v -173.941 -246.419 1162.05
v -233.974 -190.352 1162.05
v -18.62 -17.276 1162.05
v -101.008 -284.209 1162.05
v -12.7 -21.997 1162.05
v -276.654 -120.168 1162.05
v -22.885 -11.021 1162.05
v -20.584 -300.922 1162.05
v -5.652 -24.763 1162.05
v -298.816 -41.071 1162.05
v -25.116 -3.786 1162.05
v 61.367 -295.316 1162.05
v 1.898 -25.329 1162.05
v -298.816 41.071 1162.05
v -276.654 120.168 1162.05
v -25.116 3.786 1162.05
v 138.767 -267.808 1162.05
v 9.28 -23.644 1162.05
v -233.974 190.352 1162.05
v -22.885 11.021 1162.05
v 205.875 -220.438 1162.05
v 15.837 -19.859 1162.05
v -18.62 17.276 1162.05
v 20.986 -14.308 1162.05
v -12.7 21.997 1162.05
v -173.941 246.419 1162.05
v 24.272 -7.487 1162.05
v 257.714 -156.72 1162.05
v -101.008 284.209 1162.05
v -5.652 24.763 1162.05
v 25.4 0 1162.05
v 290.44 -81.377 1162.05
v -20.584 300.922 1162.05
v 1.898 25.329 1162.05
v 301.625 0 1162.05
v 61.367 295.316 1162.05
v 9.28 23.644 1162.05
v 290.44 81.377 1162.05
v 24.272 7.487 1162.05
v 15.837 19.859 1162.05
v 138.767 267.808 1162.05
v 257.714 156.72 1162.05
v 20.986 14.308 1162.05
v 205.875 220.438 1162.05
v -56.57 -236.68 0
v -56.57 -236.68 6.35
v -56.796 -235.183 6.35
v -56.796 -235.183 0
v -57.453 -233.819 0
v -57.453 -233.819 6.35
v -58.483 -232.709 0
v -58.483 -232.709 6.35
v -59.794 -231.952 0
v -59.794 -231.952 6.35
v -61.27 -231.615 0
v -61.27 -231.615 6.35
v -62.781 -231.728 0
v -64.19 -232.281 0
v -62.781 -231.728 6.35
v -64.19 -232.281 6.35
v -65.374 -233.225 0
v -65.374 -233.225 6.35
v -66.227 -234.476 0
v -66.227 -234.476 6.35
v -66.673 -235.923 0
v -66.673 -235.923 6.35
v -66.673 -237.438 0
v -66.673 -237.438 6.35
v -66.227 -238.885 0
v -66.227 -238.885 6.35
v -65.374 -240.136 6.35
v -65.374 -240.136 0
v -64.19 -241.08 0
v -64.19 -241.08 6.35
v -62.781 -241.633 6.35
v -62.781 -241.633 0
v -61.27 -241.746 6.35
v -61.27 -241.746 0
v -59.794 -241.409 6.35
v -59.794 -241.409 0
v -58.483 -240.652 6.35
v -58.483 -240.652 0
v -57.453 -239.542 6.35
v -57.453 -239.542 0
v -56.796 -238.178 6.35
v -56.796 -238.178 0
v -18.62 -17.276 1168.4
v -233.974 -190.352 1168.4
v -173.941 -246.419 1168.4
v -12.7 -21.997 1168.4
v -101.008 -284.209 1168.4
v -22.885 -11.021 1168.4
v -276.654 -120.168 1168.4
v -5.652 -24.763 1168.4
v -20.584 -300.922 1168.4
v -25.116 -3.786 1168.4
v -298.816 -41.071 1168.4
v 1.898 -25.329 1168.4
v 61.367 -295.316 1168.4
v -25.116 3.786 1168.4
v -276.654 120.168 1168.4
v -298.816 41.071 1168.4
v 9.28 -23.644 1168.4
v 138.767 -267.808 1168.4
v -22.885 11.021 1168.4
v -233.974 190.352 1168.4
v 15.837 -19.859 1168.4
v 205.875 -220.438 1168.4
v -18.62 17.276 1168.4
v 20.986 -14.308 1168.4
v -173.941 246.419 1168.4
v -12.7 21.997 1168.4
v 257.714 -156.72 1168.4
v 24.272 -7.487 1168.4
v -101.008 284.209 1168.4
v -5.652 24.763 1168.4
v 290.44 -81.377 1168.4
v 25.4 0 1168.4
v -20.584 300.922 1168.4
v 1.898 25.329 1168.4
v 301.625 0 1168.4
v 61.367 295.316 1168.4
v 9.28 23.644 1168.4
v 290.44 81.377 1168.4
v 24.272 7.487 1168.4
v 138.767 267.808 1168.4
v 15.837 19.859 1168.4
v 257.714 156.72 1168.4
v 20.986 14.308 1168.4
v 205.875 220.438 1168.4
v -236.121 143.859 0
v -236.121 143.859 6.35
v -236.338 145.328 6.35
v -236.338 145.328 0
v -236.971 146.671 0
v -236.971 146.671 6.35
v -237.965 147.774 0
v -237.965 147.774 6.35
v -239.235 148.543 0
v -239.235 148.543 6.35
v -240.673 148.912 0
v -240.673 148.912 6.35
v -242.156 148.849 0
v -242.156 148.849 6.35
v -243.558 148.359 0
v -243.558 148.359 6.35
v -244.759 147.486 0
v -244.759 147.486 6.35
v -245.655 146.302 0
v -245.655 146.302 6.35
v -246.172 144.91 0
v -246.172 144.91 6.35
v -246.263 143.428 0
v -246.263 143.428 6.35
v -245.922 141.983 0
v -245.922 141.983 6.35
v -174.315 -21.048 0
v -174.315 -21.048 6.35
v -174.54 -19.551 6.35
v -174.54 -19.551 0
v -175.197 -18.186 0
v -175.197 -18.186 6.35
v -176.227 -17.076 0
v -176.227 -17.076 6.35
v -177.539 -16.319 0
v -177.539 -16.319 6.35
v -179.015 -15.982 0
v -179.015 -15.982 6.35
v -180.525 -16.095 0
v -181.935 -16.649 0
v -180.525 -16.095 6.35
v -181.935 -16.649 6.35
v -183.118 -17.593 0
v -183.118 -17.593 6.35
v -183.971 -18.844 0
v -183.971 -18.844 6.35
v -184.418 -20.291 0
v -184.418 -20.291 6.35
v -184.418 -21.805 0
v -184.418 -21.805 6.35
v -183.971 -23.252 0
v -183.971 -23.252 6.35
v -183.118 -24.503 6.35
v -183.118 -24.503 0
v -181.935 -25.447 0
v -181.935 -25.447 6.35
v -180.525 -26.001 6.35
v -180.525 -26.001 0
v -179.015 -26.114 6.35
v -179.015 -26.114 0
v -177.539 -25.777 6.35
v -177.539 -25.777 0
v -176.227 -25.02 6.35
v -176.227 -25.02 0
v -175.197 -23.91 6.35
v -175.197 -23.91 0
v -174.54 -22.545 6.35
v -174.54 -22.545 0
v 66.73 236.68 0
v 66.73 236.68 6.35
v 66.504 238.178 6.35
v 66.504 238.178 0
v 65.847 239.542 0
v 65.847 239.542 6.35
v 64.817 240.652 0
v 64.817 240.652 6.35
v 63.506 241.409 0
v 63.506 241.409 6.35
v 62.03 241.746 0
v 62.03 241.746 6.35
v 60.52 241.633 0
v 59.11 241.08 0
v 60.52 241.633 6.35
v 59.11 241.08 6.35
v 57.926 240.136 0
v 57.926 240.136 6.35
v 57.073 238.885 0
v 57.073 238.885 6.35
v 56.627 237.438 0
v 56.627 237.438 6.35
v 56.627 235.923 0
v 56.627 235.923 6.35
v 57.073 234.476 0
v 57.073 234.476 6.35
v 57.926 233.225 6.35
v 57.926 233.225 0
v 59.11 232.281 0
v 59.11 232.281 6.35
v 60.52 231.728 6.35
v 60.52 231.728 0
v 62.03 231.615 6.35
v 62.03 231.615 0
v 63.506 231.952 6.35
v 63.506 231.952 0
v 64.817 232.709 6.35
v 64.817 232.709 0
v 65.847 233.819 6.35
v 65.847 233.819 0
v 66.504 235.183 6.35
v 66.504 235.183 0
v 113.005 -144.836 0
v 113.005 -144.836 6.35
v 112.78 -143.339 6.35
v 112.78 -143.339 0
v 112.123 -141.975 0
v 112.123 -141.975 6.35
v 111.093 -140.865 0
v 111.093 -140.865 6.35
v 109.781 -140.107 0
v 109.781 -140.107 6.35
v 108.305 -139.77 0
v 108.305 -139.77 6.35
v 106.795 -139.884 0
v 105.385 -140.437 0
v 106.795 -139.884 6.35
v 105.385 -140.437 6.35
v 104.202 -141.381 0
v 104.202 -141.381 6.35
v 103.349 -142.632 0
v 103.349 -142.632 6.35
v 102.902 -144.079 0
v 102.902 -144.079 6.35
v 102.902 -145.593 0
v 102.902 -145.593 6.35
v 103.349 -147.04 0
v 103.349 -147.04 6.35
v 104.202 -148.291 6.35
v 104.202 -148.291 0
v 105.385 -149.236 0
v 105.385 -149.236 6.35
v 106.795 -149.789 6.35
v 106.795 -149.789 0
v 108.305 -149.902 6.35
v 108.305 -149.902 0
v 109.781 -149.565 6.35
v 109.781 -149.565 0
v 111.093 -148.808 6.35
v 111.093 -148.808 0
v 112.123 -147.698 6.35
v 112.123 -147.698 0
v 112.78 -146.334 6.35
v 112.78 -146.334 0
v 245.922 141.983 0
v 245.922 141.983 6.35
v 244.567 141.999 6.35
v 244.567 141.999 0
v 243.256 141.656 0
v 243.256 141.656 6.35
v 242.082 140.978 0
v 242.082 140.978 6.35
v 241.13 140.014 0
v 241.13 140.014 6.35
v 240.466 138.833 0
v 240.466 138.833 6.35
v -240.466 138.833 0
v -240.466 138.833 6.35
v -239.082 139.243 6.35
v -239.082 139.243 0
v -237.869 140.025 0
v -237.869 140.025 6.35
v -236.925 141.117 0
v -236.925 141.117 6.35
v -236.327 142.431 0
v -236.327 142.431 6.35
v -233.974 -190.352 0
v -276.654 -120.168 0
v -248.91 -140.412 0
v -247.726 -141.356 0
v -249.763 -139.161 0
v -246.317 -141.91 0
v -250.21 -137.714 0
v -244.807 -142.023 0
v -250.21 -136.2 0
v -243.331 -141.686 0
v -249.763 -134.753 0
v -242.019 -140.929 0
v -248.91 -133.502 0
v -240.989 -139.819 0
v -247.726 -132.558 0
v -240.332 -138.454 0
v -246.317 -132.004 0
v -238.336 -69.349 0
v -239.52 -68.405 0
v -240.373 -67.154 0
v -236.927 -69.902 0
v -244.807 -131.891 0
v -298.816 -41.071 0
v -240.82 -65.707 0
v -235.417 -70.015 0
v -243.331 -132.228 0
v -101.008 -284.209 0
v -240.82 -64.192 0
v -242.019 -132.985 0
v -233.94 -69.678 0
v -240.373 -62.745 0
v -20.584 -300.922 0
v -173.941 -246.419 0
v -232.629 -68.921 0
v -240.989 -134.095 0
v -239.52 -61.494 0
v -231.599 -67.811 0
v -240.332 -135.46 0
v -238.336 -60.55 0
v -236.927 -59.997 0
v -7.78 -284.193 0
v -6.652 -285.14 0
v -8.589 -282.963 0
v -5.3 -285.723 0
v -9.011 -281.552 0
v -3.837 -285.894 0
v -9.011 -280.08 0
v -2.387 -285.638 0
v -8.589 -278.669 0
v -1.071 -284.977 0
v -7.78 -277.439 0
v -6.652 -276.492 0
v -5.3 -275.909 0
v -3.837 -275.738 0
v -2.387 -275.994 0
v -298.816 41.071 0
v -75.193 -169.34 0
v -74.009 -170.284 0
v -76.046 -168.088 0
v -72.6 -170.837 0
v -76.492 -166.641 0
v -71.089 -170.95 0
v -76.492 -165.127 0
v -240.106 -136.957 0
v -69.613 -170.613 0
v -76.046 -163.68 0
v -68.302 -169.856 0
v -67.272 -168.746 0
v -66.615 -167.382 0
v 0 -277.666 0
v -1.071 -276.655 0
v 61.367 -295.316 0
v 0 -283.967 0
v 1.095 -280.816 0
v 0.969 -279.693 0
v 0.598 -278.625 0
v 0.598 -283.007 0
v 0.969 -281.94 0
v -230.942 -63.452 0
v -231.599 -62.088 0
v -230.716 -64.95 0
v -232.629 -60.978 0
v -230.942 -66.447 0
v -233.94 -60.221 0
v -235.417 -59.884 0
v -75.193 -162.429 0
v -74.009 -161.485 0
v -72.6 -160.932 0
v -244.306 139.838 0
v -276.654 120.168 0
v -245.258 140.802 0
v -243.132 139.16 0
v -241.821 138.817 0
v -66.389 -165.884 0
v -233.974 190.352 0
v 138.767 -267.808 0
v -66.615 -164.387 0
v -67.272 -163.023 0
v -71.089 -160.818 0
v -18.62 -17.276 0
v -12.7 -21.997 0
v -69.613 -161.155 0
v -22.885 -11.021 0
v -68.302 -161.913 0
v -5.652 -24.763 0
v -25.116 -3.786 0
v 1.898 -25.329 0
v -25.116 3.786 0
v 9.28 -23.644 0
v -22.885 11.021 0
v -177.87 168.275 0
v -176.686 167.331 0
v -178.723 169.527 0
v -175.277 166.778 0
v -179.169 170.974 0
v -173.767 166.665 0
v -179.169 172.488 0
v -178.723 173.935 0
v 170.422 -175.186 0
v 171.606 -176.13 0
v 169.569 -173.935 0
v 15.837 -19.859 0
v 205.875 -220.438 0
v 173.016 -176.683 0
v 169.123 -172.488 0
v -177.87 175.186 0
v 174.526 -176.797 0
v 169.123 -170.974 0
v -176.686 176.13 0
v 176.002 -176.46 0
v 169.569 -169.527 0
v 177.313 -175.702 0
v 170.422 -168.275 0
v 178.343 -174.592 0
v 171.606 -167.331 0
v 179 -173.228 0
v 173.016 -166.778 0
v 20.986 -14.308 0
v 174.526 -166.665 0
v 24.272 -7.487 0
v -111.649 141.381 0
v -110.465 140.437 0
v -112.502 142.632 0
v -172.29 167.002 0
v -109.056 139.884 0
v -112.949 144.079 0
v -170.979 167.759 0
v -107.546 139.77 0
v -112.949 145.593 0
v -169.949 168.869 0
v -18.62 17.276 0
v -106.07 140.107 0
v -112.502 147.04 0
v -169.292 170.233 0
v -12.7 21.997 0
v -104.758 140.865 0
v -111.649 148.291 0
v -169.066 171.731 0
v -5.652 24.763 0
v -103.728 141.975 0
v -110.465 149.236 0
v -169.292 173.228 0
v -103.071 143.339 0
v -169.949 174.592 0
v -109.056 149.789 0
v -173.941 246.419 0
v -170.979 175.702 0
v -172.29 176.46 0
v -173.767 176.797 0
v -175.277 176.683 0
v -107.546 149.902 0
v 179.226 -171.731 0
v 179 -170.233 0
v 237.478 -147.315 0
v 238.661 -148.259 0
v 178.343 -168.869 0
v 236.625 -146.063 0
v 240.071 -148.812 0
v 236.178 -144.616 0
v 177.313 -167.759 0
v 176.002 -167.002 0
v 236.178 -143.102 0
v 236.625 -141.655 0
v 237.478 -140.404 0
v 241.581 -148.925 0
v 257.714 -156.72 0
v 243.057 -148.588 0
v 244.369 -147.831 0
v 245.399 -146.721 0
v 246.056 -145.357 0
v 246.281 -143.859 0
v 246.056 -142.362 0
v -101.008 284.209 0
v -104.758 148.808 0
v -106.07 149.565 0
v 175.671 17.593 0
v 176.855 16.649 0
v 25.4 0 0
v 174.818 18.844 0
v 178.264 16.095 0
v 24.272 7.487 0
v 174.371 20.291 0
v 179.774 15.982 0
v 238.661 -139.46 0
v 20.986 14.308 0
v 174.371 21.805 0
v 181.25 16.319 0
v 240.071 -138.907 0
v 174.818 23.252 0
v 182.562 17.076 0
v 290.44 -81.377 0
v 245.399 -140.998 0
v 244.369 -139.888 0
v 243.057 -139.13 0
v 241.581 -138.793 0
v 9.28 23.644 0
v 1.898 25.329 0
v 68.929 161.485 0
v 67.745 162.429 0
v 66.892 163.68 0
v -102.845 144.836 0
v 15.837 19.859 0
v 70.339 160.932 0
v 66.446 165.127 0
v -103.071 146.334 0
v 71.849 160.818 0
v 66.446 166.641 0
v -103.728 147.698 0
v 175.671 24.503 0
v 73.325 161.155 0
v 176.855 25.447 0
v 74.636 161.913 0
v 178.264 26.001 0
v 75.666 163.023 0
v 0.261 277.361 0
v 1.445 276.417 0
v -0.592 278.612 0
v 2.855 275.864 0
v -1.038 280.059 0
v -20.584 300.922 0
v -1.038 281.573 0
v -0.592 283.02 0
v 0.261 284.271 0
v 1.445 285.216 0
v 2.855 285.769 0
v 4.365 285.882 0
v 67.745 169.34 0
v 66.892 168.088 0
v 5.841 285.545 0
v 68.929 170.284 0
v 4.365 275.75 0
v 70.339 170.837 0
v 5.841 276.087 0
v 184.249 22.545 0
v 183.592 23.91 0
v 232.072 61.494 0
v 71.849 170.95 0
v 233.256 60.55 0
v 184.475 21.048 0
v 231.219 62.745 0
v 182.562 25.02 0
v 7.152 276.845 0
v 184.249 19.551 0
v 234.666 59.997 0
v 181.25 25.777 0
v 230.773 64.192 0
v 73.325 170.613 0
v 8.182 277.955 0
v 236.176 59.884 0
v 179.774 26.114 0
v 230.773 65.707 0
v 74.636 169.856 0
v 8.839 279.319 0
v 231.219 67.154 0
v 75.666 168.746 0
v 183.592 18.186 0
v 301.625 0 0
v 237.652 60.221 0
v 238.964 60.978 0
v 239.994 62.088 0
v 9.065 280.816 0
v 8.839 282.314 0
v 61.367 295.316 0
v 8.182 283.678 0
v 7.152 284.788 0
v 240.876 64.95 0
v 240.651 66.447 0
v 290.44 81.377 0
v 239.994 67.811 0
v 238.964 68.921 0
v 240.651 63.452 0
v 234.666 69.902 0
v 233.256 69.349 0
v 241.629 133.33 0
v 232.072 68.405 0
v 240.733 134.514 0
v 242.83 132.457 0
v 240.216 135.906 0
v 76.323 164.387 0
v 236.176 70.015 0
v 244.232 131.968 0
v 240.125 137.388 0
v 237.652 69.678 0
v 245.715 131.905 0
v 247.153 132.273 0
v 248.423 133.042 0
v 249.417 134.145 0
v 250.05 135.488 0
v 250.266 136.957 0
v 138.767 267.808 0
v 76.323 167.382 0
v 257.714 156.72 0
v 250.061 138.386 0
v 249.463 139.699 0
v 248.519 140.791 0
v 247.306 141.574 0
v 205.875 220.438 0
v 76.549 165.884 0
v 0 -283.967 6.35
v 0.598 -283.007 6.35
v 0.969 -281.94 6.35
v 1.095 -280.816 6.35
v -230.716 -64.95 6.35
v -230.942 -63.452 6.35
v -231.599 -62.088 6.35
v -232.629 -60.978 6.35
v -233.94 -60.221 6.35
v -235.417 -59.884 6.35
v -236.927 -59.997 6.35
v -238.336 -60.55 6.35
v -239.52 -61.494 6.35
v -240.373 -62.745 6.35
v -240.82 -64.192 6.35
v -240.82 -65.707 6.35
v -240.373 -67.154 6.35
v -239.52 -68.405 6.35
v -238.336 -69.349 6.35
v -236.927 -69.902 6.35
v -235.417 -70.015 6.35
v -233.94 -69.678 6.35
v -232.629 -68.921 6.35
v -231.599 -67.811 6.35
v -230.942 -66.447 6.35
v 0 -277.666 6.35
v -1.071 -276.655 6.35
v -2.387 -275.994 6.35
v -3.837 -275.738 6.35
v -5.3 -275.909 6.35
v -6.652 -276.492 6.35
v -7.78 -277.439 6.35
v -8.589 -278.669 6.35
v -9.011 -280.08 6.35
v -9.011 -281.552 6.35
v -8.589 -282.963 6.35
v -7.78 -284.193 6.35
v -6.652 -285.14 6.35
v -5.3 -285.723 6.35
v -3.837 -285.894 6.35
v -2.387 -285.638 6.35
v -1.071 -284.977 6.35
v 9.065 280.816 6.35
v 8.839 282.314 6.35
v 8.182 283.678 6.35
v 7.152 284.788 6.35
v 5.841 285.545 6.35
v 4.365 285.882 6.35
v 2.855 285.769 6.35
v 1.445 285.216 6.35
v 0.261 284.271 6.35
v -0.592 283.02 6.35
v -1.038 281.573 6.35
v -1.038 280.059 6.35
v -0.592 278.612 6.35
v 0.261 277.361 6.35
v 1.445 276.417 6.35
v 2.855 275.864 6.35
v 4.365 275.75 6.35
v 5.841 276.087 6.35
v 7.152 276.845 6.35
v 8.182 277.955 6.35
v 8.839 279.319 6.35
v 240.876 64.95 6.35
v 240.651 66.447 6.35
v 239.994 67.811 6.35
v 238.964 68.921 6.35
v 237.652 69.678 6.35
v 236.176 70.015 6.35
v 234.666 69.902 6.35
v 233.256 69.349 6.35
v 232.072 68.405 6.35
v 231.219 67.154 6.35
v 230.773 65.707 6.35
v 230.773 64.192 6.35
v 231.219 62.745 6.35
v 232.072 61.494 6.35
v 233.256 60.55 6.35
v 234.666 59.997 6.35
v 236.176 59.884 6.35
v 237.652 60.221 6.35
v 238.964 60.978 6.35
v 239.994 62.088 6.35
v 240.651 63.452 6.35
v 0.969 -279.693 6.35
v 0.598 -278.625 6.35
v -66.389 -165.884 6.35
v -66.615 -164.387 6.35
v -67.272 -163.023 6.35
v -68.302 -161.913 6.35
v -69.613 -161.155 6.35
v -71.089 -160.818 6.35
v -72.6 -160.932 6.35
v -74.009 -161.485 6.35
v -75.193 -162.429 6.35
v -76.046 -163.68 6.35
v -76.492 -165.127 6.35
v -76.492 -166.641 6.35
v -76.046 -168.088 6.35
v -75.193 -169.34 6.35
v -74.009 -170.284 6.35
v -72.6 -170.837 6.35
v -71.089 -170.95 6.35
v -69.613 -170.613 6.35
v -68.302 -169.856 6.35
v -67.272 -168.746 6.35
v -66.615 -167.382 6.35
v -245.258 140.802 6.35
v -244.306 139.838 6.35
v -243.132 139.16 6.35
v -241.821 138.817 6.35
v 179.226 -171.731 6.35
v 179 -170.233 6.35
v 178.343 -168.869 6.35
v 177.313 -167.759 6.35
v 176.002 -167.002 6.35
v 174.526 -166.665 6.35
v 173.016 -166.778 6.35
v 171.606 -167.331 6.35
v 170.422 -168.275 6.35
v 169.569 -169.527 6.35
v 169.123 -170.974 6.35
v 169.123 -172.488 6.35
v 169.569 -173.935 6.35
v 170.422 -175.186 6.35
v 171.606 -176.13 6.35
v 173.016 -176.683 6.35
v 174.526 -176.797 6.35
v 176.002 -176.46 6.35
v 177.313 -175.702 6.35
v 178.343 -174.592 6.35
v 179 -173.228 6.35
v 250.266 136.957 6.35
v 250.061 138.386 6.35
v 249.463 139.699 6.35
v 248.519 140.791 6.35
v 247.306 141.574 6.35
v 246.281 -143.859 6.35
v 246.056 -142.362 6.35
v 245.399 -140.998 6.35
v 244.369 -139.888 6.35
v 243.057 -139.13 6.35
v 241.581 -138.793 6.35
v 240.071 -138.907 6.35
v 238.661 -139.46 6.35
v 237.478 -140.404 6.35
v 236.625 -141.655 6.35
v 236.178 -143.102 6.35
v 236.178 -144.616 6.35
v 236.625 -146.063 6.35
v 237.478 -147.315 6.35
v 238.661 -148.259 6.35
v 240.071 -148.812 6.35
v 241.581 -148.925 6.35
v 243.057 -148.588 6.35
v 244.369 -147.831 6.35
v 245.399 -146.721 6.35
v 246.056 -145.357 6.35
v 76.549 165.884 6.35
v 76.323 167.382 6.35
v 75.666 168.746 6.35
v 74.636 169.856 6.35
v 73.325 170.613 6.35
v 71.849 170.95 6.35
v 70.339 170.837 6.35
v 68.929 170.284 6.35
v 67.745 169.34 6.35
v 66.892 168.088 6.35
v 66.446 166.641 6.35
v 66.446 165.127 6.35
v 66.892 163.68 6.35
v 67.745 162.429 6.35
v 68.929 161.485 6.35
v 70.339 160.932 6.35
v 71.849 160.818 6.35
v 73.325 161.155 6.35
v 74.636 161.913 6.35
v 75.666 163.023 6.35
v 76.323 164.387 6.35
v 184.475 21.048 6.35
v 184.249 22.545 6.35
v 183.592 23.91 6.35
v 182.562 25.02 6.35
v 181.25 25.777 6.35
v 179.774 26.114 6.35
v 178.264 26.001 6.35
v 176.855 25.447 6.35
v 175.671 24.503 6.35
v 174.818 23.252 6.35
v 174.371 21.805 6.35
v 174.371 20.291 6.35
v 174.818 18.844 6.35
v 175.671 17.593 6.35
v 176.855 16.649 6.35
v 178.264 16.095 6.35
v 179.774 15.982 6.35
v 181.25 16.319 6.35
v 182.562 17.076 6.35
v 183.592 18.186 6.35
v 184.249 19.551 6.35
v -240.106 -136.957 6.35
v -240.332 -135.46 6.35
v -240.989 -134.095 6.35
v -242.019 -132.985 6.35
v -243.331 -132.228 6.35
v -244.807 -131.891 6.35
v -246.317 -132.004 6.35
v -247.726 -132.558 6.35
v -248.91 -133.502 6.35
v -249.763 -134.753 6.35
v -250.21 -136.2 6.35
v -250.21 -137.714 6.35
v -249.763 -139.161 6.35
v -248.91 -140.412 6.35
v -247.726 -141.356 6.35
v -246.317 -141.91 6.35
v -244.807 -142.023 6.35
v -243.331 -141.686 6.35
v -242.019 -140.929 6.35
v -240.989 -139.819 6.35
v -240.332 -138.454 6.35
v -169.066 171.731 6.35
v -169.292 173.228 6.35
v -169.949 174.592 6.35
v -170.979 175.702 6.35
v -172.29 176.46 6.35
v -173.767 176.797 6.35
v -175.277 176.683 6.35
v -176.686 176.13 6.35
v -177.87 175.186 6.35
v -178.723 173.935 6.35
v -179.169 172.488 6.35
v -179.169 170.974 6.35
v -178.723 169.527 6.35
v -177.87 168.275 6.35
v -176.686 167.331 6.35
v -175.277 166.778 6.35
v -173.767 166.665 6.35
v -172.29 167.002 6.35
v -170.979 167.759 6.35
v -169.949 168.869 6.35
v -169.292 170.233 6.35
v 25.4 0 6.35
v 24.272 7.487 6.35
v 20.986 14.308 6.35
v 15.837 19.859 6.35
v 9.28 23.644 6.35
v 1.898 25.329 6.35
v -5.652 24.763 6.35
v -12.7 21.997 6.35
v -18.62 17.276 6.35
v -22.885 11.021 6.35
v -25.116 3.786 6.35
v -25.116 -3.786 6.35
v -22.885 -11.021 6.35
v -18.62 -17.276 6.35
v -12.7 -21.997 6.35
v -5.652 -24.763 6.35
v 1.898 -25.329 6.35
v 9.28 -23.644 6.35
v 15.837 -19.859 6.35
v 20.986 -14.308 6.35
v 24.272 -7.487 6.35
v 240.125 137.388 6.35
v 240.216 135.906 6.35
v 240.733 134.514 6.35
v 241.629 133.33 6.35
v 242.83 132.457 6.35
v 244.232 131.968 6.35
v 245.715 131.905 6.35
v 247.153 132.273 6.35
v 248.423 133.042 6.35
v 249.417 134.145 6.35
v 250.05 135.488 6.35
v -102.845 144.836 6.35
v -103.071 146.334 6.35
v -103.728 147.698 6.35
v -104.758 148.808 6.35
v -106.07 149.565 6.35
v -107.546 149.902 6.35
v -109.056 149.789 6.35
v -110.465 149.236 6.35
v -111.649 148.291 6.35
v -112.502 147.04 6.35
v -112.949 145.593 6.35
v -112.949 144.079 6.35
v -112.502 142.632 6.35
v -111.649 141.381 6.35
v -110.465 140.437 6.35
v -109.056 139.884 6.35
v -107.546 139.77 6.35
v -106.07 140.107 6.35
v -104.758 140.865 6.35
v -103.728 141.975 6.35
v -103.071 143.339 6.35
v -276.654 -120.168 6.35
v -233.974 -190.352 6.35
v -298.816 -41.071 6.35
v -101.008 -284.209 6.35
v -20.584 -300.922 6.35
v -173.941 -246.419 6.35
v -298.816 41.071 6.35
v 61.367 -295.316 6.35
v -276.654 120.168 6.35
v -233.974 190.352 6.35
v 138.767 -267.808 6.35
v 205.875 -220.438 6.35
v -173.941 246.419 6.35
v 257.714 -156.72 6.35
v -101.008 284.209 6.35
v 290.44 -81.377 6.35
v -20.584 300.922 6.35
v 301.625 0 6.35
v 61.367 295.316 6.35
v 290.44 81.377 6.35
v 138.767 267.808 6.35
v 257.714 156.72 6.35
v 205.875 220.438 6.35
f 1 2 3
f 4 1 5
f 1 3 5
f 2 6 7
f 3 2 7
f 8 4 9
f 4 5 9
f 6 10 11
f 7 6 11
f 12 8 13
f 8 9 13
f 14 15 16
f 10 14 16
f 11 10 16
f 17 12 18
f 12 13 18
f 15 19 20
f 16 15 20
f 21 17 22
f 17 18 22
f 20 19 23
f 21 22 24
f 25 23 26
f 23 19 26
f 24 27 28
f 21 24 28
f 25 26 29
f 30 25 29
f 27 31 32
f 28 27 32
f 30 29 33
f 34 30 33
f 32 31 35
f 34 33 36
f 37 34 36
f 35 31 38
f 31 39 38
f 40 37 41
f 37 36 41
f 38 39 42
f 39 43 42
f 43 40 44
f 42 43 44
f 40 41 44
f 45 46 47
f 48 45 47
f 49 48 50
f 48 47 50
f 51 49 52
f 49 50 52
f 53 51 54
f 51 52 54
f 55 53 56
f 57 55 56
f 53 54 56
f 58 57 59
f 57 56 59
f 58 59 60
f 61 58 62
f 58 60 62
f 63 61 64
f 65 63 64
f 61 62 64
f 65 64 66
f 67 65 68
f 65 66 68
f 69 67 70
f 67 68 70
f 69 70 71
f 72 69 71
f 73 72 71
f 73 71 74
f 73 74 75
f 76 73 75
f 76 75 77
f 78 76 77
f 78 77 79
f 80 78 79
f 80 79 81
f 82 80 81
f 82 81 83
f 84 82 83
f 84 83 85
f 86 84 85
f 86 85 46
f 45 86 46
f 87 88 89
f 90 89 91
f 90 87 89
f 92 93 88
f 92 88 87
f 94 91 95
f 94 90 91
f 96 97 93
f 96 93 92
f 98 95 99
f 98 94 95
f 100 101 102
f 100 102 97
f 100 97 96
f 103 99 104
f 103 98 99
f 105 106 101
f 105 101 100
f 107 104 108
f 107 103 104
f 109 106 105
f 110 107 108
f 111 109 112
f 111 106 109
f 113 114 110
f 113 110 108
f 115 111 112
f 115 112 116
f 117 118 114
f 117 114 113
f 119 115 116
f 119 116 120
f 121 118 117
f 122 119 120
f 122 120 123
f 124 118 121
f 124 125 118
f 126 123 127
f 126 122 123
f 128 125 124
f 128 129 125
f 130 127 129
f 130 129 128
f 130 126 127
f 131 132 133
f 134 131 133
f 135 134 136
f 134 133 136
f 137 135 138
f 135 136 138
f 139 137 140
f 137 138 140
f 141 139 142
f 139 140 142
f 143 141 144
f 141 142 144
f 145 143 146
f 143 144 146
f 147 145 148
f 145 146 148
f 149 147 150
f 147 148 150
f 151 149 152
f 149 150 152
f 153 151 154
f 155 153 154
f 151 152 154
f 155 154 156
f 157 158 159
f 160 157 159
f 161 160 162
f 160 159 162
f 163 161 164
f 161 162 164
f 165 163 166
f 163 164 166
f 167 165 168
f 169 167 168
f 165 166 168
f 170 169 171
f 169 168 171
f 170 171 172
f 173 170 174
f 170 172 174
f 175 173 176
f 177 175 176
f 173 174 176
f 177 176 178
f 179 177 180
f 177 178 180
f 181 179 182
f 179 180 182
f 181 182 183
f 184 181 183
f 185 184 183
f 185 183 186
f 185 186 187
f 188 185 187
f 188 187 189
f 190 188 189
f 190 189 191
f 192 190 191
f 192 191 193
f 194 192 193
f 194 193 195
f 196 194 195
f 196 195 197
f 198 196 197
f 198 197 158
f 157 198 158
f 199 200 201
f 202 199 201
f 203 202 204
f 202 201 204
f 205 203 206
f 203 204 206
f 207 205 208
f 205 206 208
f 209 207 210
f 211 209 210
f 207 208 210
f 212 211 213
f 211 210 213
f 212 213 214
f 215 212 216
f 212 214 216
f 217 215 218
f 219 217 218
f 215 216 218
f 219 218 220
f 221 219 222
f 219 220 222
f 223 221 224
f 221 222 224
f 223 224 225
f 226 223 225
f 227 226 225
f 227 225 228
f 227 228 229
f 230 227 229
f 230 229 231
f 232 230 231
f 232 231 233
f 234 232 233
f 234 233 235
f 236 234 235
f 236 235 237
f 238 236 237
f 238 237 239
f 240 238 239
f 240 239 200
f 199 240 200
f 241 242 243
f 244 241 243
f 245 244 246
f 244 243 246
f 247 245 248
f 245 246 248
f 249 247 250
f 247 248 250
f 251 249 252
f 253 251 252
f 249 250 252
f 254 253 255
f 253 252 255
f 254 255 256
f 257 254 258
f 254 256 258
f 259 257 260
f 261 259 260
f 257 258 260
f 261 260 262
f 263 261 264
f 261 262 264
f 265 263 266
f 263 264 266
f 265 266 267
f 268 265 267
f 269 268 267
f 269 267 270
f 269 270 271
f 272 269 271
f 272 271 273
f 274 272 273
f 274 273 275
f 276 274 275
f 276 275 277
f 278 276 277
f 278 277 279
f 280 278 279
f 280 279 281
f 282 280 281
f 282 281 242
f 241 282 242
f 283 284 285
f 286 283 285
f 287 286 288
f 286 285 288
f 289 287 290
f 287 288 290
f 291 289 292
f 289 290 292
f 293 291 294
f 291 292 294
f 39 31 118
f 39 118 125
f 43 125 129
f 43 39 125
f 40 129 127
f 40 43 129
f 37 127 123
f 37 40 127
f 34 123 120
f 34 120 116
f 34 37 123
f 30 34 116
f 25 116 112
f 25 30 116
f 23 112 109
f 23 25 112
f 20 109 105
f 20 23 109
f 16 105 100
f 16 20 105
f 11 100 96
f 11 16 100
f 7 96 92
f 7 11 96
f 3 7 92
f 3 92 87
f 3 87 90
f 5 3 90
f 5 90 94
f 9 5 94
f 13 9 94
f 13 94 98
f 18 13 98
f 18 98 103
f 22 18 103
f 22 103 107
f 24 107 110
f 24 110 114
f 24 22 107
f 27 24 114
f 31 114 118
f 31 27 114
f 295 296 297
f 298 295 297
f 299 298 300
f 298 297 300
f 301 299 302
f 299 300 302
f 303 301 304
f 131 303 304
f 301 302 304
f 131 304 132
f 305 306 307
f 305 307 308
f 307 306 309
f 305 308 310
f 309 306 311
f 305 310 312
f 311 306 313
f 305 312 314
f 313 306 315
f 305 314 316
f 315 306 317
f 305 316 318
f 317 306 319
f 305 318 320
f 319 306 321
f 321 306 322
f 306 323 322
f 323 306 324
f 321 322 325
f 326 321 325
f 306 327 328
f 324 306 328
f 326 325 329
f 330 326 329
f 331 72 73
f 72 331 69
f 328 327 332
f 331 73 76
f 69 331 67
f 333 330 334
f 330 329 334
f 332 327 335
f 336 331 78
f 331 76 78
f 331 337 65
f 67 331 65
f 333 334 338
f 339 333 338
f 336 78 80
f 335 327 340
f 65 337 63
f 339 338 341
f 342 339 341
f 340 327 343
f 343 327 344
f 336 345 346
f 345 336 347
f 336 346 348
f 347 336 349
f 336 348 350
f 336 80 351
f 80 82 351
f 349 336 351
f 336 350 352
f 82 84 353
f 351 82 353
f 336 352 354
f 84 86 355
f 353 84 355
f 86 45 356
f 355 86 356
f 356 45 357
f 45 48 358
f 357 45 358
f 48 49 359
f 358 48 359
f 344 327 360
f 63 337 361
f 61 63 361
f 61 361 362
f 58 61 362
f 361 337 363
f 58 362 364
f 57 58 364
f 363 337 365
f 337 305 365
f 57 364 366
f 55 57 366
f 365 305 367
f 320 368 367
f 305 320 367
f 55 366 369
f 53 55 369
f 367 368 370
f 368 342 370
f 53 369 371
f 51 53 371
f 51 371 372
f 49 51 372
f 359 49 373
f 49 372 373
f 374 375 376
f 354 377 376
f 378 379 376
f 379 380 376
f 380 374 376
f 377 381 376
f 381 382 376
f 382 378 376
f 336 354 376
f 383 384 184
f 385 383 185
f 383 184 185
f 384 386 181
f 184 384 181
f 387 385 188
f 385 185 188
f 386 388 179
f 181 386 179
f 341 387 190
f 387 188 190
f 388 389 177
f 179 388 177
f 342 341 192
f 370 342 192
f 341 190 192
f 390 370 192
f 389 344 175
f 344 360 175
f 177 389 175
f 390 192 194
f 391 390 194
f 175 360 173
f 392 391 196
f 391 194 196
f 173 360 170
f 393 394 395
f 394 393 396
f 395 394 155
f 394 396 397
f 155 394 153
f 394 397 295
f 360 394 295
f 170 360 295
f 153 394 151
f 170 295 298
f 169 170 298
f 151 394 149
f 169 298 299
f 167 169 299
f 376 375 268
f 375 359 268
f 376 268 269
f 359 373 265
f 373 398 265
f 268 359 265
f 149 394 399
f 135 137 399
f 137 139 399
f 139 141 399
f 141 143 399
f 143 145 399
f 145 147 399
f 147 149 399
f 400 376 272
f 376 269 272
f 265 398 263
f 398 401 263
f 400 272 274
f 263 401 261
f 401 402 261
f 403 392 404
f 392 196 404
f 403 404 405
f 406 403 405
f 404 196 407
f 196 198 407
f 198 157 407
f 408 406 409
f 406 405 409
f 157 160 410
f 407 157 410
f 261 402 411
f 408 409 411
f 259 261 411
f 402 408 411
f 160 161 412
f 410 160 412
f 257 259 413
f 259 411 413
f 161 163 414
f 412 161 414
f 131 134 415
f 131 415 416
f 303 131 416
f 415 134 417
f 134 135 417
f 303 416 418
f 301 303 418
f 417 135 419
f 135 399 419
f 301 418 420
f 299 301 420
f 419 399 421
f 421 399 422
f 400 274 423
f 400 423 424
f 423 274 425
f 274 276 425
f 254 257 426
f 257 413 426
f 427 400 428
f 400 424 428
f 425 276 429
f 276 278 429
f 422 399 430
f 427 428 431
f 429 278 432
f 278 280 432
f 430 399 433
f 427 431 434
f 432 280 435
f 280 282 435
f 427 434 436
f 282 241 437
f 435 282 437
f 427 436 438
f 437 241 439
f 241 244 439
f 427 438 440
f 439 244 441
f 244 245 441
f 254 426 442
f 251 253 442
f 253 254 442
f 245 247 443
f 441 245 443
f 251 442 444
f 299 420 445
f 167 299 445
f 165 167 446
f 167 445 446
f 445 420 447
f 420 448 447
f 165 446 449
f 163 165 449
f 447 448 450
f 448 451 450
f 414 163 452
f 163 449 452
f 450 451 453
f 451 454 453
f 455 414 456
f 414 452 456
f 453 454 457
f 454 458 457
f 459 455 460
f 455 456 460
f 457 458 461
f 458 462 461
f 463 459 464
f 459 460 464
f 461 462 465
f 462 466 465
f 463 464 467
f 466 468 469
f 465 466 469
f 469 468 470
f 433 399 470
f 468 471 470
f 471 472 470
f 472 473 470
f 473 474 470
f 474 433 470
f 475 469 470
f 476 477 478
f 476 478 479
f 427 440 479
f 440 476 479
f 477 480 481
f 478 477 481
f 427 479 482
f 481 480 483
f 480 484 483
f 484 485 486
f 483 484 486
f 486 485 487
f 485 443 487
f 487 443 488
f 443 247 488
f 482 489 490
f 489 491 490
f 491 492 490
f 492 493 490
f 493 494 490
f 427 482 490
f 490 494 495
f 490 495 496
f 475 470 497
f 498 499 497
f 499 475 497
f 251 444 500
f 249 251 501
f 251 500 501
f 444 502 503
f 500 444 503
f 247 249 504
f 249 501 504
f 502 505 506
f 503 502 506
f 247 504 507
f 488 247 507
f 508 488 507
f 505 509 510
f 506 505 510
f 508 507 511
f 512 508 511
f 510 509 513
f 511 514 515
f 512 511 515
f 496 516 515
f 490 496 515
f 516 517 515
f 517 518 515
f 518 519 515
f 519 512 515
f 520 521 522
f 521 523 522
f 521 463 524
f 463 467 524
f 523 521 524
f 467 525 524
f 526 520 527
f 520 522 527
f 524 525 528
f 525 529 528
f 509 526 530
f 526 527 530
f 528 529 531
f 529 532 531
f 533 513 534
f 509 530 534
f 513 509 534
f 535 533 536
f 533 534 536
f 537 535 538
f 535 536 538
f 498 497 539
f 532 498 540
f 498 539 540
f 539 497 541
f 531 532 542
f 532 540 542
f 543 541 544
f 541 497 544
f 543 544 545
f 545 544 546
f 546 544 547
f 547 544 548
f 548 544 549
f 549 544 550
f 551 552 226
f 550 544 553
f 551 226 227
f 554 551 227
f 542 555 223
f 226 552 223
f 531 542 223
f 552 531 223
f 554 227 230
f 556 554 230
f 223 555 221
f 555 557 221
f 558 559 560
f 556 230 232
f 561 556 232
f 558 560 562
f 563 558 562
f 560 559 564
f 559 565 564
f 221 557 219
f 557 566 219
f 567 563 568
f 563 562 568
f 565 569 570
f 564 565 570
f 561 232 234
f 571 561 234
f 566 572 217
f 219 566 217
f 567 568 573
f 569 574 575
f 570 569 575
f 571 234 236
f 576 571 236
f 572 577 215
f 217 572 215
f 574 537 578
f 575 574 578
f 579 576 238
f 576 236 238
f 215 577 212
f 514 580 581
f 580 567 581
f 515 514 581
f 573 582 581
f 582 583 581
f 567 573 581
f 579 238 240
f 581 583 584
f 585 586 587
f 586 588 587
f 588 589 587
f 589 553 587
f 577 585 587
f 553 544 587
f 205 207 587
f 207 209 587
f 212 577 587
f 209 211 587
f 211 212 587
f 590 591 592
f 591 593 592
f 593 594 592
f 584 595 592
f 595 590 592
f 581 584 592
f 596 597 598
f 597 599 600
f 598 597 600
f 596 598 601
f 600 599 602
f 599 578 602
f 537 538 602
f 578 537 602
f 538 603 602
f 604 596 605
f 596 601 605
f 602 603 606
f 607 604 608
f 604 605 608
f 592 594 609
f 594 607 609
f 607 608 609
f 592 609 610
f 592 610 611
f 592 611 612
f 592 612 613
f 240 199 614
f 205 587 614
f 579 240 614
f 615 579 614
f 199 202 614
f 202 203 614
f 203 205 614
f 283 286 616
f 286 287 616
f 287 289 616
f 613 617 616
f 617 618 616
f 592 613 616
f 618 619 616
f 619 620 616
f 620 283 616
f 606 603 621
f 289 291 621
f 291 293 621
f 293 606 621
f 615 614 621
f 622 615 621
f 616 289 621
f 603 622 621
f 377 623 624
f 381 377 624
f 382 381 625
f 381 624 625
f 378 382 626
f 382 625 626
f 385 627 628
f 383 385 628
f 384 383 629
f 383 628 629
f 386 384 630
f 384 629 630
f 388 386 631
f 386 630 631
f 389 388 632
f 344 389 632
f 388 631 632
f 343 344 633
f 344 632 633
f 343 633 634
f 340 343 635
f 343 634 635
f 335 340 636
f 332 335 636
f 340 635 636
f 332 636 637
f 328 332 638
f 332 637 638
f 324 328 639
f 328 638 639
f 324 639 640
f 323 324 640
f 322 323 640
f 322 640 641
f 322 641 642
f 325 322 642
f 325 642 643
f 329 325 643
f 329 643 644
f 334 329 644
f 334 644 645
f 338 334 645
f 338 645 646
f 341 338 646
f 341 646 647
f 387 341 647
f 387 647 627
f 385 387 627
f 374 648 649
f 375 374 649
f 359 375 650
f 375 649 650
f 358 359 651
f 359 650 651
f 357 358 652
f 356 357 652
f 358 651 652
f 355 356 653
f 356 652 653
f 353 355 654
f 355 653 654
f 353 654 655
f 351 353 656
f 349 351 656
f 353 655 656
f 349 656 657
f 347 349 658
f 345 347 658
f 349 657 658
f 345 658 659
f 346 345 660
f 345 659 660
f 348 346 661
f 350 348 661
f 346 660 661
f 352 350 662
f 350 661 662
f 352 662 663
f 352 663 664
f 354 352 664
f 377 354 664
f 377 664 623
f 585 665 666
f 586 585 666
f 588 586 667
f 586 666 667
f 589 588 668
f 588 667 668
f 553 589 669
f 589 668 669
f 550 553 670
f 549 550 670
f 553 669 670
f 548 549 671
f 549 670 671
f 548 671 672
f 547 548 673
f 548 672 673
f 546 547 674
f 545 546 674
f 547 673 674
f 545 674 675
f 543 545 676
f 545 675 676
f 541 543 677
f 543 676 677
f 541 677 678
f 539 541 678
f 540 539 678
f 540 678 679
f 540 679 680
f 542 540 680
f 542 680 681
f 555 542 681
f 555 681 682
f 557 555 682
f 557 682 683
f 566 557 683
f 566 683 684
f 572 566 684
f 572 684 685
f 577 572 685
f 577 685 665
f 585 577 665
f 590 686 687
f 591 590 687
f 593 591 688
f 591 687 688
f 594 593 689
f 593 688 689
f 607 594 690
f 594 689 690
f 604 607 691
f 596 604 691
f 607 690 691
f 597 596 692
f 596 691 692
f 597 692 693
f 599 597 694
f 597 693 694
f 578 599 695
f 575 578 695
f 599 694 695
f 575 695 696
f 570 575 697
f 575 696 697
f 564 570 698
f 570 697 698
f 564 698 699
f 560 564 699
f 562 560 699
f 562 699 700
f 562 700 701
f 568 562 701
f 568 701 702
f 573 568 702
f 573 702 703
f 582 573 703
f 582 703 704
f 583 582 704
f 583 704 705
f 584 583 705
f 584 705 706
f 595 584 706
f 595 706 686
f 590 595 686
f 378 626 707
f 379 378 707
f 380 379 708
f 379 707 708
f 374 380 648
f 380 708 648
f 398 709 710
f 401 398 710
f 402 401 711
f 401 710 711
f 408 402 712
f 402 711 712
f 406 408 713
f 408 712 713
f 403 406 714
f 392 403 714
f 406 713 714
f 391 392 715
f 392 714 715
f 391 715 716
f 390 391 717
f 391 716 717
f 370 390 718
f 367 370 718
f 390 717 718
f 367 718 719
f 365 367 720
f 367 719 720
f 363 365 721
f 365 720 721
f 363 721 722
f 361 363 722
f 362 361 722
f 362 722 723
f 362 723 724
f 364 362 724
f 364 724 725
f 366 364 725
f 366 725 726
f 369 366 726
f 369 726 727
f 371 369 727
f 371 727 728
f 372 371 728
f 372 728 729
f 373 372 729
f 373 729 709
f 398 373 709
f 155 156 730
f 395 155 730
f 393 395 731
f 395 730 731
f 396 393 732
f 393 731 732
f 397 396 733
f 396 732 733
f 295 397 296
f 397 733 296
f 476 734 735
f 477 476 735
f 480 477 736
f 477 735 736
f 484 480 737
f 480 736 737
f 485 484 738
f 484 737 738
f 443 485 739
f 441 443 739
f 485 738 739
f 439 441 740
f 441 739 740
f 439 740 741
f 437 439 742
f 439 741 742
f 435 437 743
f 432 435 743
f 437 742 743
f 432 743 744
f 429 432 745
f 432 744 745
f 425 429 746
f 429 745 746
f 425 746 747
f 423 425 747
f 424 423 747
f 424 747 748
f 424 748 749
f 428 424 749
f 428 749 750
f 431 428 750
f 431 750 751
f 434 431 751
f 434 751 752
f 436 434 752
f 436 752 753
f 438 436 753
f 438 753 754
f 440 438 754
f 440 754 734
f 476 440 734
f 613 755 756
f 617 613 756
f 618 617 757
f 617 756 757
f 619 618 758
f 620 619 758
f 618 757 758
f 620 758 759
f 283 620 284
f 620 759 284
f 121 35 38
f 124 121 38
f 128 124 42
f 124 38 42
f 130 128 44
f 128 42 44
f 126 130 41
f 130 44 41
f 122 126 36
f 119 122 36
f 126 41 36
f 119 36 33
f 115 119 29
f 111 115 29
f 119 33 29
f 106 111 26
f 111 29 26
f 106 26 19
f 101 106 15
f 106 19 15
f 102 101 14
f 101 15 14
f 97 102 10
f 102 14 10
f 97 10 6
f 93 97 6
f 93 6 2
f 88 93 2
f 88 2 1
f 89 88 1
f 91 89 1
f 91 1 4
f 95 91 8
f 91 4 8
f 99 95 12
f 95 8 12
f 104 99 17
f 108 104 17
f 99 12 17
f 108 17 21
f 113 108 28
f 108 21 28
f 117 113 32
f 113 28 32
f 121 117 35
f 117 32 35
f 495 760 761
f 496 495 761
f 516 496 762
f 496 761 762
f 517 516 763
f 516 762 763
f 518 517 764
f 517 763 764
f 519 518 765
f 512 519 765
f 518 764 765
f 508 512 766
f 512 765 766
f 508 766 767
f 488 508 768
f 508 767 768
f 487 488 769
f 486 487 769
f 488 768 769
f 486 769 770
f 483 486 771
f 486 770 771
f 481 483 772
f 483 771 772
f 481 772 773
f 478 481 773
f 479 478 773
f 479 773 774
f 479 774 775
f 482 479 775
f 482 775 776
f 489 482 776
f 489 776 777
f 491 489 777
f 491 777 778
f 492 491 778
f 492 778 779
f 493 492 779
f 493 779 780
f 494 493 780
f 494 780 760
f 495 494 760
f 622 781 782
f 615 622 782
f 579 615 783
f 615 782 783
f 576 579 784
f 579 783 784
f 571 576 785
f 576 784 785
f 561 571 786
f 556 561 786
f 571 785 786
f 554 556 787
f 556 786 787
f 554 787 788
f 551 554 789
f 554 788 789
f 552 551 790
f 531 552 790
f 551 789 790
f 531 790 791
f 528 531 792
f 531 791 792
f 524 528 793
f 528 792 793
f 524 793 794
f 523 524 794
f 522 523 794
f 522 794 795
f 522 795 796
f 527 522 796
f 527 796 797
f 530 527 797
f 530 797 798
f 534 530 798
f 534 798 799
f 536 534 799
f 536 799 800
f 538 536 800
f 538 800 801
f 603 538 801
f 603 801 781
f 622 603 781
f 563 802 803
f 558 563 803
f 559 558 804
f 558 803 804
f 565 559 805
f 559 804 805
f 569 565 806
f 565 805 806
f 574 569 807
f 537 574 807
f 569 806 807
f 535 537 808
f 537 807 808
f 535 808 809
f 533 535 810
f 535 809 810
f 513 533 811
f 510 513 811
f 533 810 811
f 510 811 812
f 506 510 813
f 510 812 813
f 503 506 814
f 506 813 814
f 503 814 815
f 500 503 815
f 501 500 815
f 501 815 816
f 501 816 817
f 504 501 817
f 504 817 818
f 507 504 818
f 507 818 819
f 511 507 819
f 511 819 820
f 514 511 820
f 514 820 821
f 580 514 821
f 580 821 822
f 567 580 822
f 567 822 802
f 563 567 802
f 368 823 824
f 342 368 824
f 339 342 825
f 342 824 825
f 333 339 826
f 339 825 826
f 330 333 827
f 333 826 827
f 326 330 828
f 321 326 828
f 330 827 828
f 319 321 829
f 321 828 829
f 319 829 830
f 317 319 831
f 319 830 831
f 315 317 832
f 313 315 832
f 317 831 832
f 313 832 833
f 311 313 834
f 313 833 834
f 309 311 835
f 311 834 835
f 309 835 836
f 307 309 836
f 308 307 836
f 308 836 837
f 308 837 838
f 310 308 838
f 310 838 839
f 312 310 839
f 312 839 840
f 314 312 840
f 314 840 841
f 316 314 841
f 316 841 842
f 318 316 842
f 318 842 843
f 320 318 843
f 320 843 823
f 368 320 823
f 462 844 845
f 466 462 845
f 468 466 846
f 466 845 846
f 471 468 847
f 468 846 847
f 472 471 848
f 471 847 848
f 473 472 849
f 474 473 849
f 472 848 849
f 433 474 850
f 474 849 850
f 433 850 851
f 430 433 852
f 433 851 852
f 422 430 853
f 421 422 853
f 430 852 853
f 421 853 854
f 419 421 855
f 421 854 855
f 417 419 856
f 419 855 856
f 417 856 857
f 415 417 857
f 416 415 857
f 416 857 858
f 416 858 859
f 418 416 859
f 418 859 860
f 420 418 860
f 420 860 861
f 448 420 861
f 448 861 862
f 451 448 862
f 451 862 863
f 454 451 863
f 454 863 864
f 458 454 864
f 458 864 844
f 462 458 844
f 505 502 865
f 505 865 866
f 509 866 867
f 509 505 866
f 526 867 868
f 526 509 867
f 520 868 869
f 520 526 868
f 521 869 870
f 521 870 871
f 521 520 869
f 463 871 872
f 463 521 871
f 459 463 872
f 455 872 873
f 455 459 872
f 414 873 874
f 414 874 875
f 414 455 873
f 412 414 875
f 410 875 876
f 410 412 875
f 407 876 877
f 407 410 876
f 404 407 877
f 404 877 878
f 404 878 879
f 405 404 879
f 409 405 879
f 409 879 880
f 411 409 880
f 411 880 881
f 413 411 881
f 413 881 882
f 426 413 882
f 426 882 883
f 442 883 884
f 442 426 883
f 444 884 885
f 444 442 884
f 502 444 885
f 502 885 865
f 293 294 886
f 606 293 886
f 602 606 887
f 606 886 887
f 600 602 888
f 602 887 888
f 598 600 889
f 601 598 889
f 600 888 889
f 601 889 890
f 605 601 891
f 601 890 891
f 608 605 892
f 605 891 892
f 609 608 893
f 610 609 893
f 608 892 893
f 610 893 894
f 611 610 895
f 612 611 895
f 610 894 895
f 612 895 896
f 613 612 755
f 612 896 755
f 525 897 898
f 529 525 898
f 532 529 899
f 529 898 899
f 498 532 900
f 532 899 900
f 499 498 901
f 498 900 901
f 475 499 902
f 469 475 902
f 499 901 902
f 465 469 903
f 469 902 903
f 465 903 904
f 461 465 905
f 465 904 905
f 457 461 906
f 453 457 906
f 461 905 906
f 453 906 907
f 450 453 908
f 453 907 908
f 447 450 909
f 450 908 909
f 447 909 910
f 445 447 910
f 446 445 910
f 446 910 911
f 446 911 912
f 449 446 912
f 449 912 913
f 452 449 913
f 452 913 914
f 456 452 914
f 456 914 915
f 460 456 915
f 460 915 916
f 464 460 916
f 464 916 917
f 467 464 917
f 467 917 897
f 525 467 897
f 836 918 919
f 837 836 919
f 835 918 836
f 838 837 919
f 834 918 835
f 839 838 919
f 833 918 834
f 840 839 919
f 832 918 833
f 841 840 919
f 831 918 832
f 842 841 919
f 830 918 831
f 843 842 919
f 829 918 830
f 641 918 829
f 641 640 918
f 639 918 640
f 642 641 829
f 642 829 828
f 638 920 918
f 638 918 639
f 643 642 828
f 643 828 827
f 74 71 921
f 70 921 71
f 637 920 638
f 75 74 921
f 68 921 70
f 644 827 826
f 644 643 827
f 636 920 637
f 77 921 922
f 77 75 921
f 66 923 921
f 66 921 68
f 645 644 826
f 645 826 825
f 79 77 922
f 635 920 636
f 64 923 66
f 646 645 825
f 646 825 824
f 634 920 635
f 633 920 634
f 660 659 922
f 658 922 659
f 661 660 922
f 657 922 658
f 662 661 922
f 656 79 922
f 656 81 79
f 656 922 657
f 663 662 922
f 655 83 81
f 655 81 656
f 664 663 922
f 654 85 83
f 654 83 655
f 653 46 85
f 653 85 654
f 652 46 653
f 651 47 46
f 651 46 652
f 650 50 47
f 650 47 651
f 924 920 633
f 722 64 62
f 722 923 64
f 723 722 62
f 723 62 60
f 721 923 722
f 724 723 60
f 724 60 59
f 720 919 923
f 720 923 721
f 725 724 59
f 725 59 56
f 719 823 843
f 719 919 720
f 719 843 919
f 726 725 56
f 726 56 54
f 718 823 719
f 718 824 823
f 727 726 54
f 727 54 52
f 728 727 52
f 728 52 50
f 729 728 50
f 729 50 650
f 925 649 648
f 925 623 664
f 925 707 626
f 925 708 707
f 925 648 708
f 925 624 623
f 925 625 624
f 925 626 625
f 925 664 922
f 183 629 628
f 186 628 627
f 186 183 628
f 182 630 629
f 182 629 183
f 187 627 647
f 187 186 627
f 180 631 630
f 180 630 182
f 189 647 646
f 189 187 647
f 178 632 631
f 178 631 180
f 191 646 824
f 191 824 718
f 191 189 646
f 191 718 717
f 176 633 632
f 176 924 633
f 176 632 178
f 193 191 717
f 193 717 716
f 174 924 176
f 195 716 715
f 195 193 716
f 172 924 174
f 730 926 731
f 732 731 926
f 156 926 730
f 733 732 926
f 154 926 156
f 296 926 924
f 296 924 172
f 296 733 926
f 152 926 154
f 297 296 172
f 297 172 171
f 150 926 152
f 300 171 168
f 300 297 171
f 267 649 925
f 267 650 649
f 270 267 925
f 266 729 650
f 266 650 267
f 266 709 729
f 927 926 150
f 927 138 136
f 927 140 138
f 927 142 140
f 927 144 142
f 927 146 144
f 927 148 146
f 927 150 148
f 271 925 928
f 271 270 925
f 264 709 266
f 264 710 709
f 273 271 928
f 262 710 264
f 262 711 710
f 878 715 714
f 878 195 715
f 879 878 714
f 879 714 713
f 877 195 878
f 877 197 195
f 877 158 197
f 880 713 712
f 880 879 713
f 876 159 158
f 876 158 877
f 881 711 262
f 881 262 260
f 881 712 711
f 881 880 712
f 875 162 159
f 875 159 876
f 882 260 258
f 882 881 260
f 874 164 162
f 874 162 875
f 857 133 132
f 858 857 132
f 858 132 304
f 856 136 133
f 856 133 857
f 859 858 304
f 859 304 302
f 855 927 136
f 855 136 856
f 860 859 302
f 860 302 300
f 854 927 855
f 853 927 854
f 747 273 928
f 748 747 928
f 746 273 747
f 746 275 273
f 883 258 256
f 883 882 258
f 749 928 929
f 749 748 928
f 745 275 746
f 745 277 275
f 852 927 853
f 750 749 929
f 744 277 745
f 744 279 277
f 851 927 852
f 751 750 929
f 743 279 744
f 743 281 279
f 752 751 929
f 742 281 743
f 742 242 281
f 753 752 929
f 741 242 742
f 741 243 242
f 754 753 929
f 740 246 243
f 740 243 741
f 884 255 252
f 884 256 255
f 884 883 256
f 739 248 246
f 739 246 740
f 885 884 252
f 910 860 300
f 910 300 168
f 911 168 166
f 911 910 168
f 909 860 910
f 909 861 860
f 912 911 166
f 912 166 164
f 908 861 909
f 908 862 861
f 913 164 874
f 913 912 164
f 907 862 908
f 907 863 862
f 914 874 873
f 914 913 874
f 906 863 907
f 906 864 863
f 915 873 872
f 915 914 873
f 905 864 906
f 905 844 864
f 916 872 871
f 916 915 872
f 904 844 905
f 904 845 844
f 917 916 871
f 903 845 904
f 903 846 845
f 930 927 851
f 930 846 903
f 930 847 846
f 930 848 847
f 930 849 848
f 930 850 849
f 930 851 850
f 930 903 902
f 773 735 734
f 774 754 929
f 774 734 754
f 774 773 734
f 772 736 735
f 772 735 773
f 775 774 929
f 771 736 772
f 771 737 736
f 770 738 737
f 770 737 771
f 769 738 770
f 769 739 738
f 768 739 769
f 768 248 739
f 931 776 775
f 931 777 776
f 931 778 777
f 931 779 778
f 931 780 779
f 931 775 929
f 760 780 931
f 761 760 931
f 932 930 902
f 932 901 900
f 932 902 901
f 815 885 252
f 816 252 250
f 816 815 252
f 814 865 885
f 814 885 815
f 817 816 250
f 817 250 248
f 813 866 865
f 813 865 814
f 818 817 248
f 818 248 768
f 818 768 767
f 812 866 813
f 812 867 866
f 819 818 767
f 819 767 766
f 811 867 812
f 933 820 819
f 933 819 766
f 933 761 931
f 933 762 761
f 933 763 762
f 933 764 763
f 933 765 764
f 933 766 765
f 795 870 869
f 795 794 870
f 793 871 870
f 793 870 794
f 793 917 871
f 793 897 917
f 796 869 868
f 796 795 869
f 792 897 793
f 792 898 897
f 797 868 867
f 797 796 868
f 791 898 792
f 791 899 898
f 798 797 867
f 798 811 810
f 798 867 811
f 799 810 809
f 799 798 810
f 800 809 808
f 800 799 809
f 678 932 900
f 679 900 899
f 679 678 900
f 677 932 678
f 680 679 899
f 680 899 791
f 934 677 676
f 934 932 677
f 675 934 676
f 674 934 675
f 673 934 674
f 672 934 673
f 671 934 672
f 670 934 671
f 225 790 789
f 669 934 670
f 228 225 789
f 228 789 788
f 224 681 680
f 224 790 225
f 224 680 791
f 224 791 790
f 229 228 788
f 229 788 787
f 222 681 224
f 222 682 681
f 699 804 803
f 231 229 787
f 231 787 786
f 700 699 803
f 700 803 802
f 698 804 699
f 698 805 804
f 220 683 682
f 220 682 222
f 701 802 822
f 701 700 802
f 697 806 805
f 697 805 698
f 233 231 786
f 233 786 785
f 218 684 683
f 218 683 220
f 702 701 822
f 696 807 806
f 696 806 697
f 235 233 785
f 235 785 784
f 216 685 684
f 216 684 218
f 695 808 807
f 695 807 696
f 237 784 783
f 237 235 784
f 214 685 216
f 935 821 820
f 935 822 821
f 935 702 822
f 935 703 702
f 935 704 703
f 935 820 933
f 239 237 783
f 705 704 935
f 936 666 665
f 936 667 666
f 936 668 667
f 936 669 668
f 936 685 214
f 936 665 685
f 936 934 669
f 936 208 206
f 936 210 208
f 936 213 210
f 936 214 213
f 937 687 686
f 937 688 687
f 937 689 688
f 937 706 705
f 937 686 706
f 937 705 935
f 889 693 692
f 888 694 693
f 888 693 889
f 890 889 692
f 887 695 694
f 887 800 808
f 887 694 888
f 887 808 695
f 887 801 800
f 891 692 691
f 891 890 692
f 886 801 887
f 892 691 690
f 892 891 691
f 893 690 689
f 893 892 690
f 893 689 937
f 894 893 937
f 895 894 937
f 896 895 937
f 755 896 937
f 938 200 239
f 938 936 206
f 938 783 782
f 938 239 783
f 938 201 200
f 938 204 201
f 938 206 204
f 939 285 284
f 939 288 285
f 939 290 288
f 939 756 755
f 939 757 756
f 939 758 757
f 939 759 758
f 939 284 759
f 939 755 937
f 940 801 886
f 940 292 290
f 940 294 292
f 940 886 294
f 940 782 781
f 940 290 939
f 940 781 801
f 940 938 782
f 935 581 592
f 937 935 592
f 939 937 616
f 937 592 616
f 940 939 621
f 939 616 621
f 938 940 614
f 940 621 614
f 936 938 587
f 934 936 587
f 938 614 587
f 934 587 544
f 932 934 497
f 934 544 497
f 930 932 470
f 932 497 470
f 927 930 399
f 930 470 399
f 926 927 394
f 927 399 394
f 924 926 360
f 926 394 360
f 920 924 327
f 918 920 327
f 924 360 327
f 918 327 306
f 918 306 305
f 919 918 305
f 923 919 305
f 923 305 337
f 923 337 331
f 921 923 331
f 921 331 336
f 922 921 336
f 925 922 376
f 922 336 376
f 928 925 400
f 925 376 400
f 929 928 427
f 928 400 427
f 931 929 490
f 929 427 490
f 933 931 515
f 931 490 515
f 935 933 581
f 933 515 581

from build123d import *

# Parameters (mm, degrees)
F0_R     = 301.625
F0_R_2   = 25.4
F1_DEPTH = 6.35
F5_R     = 301.625
F5_R_2   = 25.4
F7_DEPTH = 6.35
F6_R     = 5.08
F8_DEPTH = 6.351


# Not quite as in the source:
# - the program builds the solid bodies; features that only make, move or delete a surface that nothing else refers to are left out


with BuildPart() as f1:
    # F0 (on Top) → F1 (new body)
    with BuildSketch(Plane.XY):
        Circle(F0_R)
        Circle(F0_R_2, mode=Mode.SUBTRACT)
    extrude(amount=F1_DEPTH)

    # F6 (on face) → F8 (cut, through all)
    with BuildSketch(Plane.XY.offset(6.35)):
        with BuildLine():
            Line((-240.46551283, 138.8328285632), (-245.9224430153, 141.9833886746))
            ThreePointArc((-245.9224430153, 141.9833886746), (-243.7414687643, 139.4598266645), (-240.46551283, 138.8328285632))
        make_face()
        with BuildLine():
            ThreePointArc((-236.1214687643, 143.8592357157), (-242.1564166176, 148.8486720163), (-245.9224430153, 141.9833886746))
            Line((-245.9224430153, 141.9833886746), (-240.46551283, 138.8328285632))
            ThreePointArc((-240.46551283, 138.8328285632), (-237.3579641041, 140.5375084652), (-236.1214687643, 143.8592357157))
        make_face()
        with Locations((-174.1461598977, 171.7307498537)):
            Circle(F6_R)
        with Locations((-107.9254532481, 144.8362073709)):
            Circle(F6_R)
        with Locations((-245.186487081, -136.9569815221)):
            Circle(F6_R)
        with Locations((-235.7962719331, -64.949623516)):
            Circle(F6_R)
        with Locations((-179.394561595, -21.0480805423)):
            Circle(F6_R)
        with BuildLine():
            ThreePointArc((0, -277.6656571265), (-9.0650183167, -280.8162172379), (0, -283.9667773493))
            Line((0, -283.9667773493), (0, -277.6656571265))
        make_face()
        with BuildLine():
            Line((0, -277.6656571265), (0, -283.9667773493))
            ThreePointArc((0, -283.9667773493), (0.8134341968, -282.4839262879), (1.0949816833, -280.8162172379))
            ThreePointArc((1.0949816833, -280.8162172379), (0.8134341968, -279.1485081878), (0, -277.6656571265))
        make_face()
        with Locations((-61.6501120354, -236.6803733697)):
            Circle(F6_R)
        with Locations((-71.469108347, -165.8842879132)):
            Circle(F6_R)
        with Locations((107.9254532481, -144.8362073709)):
            Circle(F6_R)
        with Locations((174.1461598977, -171.7307498537)):
            Circle(F6_R)
        with Locations((241.2014687643, -143.8592357157)):
            Circle(F6_R)
        with Locations((179.394561595, 21.0480805423)):
            Circle(F6_R)
        with Locations((235.7962719331, 64.949623516)):
            Circle(F6_R)
        with BuildLine():
            Line((240.46551283, 138.8328285632), (245.9224430153, 141.9833886746))
            ThreePointArc((245.9224430153, 141.9833886746), (242.646487081, 141.3563905734), (240.46551283, 138.8328285632))
        make_face()
        with BuildLine():
            ThreePointArc((250.266487081, 136.9569815221), (249.0299917412, 140.2787087727), (245.9224430153, 141.9833886746))
            Line((245.9224430153, 141.9833886746), (240.46551283, 138.8328285632))
            ThreePointArc((240.46551283, 138.8328285632), (244.2315392277, 131.9675452216), (250.266487081, 136.9569815221))
        make_face()
        with Locations((71.469108347, 165.8842879132)):
            Circle(F6_R)
        with Locations((61.6501120354, 236.6803733697)):
            Circle(F6_R)
        with Locations((3.9850183167, 280.8162172379)):
            Circle(F6_R)
    extrude(amount=-F8_DEPTH, mode=Mode.SUBTRACT)


with BuildPart() as f7:
    # F5 (on offset) → F7 (new body)
    with BuildSketch(Plane.XY.offset(1162.05)):
        Circle(F5_R)
        Circle(F5_R_2, mode=Mode.SUBTRACT)
    extrude(amount=F7_DEPTH)


solid = Compound([f1.part, f7.part])
